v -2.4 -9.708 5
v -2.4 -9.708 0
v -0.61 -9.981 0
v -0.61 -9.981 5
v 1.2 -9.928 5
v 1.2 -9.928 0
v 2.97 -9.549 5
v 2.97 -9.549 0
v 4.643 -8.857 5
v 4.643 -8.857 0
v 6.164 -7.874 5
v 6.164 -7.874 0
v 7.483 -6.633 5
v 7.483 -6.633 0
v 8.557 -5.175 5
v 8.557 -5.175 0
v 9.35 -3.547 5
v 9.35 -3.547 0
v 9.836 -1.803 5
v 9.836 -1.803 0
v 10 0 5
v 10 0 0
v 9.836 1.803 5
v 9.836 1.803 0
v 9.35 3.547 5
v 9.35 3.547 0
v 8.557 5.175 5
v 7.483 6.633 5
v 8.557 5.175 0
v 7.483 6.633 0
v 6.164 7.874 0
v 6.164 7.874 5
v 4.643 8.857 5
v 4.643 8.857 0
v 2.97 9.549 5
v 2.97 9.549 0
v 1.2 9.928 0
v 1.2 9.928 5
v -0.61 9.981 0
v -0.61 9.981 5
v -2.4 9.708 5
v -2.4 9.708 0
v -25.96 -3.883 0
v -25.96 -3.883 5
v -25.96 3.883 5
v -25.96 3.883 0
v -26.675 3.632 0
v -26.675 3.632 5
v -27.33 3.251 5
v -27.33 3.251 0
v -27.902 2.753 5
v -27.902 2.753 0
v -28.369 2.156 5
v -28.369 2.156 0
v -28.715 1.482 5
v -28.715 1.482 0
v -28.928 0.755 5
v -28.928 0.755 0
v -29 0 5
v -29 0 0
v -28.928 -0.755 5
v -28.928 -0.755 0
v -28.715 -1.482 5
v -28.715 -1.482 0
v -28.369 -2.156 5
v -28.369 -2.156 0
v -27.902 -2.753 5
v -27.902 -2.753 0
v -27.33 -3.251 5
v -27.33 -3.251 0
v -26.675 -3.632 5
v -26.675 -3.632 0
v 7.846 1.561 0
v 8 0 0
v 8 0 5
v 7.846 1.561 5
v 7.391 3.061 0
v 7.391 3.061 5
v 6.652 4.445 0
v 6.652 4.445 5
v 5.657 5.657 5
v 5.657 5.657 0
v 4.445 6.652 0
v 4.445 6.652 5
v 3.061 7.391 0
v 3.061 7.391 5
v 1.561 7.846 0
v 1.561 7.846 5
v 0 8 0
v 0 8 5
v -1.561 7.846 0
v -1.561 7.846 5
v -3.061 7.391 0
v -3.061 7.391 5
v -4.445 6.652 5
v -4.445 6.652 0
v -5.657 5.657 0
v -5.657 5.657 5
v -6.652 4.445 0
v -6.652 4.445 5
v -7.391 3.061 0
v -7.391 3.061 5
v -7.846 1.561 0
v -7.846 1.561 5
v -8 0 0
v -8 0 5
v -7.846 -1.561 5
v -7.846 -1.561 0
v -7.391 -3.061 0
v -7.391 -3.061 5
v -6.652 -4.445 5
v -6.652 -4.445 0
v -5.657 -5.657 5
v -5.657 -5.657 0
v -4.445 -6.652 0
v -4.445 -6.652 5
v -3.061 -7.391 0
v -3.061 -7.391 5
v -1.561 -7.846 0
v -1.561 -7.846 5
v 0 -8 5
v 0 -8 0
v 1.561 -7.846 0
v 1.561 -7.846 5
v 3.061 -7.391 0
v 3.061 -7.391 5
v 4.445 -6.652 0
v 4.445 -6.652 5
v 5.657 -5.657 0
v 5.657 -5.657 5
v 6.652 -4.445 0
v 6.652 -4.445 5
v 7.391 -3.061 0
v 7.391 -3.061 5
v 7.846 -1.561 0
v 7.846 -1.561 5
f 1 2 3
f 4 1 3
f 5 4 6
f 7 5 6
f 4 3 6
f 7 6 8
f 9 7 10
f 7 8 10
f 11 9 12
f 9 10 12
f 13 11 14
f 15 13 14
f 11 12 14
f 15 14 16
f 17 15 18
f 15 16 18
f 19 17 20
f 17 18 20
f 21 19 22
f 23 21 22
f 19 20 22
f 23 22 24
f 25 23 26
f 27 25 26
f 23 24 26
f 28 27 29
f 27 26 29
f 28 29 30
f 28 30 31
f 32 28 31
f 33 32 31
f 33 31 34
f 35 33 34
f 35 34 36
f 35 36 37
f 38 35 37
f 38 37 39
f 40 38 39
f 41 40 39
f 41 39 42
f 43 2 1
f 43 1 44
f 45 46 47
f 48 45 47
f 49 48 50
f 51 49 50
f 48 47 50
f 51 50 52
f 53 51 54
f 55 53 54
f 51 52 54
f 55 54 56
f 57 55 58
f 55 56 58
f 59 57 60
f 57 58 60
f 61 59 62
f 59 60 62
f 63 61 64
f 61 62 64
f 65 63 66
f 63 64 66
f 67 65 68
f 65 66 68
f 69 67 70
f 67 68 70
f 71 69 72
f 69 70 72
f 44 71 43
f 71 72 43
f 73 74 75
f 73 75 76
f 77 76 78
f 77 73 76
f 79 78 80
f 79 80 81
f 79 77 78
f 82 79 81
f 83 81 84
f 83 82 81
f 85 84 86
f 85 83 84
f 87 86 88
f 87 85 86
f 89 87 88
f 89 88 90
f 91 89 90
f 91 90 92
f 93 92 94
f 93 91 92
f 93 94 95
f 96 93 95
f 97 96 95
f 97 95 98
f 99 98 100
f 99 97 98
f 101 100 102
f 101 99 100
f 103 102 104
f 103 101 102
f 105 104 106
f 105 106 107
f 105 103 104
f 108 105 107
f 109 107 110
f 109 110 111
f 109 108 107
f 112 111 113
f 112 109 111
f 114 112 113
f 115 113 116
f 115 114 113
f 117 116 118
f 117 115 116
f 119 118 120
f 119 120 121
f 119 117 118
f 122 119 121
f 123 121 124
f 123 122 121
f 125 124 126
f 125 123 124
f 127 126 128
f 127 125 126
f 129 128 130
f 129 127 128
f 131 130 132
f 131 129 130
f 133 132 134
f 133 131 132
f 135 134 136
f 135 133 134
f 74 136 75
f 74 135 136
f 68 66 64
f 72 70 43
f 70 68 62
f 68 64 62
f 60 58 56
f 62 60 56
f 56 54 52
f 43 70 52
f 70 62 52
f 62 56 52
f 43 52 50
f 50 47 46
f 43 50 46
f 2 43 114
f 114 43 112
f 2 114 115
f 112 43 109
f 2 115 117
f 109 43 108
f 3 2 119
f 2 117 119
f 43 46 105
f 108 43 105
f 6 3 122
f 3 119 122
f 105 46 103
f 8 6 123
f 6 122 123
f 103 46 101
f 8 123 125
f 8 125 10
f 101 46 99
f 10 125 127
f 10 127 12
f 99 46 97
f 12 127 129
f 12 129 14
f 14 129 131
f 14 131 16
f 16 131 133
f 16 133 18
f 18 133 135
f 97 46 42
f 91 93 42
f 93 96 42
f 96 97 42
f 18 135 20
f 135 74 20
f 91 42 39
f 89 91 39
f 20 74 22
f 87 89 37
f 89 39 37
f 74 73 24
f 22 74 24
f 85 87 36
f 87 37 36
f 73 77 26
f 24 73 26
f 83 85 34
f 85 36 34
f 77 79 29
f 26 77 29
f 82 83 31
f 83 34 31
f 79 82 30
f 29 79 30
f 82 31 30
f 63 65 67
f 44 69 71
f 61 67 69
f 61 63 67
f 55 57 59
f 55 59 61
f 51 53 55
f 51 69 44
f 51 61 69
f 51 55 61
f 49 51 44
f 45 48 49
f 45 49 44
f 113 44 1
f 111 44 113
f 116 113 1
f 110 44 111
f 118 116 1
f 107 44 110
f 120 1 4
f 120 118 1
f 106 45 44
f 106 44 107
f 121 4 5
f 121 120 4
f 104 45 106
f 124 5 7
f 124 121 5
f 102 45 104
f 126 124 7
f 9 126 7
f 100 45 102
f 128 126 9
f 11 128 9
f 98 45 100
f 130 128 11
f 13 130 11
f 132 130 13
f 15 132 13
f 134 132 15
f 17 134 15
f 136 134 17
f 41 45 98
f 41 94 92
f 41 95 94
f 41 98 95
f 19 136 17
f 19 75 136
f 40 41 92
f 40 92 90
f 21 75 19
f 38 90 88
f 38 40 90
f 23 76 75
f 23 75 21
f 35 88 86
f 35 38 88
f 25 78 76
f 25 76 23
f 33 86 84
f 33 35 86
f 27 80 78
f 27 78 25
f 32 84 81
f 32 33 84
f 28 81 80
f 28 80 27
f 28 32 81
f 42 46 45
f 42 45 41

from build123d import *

# Parameters (mm, degrees)
SKETCH_R  = 8
PAD_DEPTH = 5


with BuildPart() as part:
    # Sketch → Pad (new body)
    with BuildSketch(Plane.XY):
        with BuildLine():
            ThreePointArc((-2.4, -9.707729), (10, 0), (-2.4, 9.707729))
            Line((-25.96, 3.883092), (-2.4, 9.707729))
            ThreePointArc((-25.96, 3.883092), (-29, 0), (-25.96, -3.883092))
            Line((-2.4, -9.707729), (-25.96, -3.883092))
        make_face()
        Circle(SKETCH_R, mode=Mode.SUBTRACT)
    extrude(amount=PAD_DEPTH)


solid = part.part
